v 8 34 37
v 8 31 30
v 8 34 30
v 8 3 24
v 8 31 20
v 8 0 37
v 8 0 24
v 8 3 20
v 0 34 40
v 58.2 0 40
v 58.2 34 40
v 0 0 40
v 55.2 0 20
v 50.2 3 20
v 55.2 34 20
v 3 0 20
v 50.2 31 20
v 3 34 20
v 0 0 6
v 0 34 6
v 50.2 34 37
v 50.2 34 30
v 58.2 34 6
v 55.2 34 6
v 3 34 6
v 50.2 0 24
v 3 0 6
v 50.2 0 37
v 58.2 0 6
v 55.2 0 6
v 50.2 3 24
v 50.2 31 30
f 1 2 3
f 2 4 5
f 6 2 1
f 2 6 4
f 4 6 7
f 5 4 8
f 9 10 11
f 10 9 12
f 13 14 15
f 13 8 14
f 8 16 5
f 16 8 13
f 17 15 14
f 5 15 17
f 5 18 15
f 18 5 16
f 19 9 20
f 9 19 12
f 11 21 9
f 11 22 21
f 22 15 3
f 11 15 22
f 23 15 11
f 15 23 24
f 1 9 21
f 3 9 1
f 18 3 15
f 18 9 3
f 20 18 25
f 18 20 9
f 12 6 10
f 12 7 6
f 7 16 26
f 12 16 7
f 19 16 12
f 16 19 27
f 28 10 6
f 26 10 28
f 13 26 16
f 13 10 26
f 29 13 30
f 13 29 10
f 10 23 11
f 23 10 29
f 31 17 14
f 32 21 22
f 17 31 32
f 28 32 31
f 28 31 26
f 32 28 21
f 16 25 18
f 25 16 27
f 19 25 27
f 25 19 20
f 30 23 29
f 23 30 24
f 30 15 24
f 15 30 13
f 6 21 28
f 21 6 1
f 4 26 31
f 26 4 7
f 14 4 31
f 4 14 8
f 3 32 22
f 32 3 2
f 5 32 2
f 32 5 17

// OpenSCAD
// ============================================================
// EOTech-style shroud — enclosed rectangular window frame
//
//   eotech_shroud(...)  solid left/right side walls, a top hood bar, short
//                       front/rear lower lips, and the skirts that drop below
//                       the seam to lap the bottom part.  The centre opening
//                       (front and rear faces) is left clear for viewing.
//
// All dimensions are passed in from the assembly except rear_lip_h, which is
// shroud-private (default 4 mm).
// ============================================================

module eotech_shroud(body_w, body_d, body_height, side_edge, shroud_wall,
                     shroud_h, lip_h, lap_h, skirt_t, rear_lip_h = 4.0) {
  se = side_edge;
  sw = shroud_wall;
  bh = body_height;
  bw = body_w;
  bd = body_d;
  sh = shroud_h;

  // Left/right side walls (thick edges, full height, full depth)
  translate([0, 0, bh])
    cube([se, bd, sh]);
  translate([bw - se, 0, bh])
    cube([se, bd, sh]);

  // Left/right skirts — drop below the seam to lap the bottom part's
  // rebated side faces; the horizontal joint screws pass through these.
  translate([0, 0, bh - lap_h])
    cube([skirt_t, bd, lap_h]);
  translate([bw - skirt_t, 0, bh - lap_h])
    cube([skirt_t, bd, lap_h]);

  // Top hood bar (full width, full depth)
  translate([0, 0, bh + sh - sw])
    cube([bw, bd, sw]);

  // Rear lower lip (Y=0 face, between side walls) — lowered for sight picture
  translate([se, 0, bh])
    cube([bw - 2 * se, sw, rear_lip_h]);

  // Front lower lip (Y=body_d face, between side walls)
  translate([se, bd - sw, bh])
    cube([bw - 2 * se, sw, lip_h]);
}

// ── Demo (renders only when this file is opened directly) ────
$fn = 48;
eotech_shroud(body_w = 58.20, body_d = 34.00, body_height = 20.00,
              side_edge = 8.00, shroud_wall = 3.00, shroud_h = 20.00,
              lip_h = 10.00, lap_h = 14.00, skirt_t = 3.00);
